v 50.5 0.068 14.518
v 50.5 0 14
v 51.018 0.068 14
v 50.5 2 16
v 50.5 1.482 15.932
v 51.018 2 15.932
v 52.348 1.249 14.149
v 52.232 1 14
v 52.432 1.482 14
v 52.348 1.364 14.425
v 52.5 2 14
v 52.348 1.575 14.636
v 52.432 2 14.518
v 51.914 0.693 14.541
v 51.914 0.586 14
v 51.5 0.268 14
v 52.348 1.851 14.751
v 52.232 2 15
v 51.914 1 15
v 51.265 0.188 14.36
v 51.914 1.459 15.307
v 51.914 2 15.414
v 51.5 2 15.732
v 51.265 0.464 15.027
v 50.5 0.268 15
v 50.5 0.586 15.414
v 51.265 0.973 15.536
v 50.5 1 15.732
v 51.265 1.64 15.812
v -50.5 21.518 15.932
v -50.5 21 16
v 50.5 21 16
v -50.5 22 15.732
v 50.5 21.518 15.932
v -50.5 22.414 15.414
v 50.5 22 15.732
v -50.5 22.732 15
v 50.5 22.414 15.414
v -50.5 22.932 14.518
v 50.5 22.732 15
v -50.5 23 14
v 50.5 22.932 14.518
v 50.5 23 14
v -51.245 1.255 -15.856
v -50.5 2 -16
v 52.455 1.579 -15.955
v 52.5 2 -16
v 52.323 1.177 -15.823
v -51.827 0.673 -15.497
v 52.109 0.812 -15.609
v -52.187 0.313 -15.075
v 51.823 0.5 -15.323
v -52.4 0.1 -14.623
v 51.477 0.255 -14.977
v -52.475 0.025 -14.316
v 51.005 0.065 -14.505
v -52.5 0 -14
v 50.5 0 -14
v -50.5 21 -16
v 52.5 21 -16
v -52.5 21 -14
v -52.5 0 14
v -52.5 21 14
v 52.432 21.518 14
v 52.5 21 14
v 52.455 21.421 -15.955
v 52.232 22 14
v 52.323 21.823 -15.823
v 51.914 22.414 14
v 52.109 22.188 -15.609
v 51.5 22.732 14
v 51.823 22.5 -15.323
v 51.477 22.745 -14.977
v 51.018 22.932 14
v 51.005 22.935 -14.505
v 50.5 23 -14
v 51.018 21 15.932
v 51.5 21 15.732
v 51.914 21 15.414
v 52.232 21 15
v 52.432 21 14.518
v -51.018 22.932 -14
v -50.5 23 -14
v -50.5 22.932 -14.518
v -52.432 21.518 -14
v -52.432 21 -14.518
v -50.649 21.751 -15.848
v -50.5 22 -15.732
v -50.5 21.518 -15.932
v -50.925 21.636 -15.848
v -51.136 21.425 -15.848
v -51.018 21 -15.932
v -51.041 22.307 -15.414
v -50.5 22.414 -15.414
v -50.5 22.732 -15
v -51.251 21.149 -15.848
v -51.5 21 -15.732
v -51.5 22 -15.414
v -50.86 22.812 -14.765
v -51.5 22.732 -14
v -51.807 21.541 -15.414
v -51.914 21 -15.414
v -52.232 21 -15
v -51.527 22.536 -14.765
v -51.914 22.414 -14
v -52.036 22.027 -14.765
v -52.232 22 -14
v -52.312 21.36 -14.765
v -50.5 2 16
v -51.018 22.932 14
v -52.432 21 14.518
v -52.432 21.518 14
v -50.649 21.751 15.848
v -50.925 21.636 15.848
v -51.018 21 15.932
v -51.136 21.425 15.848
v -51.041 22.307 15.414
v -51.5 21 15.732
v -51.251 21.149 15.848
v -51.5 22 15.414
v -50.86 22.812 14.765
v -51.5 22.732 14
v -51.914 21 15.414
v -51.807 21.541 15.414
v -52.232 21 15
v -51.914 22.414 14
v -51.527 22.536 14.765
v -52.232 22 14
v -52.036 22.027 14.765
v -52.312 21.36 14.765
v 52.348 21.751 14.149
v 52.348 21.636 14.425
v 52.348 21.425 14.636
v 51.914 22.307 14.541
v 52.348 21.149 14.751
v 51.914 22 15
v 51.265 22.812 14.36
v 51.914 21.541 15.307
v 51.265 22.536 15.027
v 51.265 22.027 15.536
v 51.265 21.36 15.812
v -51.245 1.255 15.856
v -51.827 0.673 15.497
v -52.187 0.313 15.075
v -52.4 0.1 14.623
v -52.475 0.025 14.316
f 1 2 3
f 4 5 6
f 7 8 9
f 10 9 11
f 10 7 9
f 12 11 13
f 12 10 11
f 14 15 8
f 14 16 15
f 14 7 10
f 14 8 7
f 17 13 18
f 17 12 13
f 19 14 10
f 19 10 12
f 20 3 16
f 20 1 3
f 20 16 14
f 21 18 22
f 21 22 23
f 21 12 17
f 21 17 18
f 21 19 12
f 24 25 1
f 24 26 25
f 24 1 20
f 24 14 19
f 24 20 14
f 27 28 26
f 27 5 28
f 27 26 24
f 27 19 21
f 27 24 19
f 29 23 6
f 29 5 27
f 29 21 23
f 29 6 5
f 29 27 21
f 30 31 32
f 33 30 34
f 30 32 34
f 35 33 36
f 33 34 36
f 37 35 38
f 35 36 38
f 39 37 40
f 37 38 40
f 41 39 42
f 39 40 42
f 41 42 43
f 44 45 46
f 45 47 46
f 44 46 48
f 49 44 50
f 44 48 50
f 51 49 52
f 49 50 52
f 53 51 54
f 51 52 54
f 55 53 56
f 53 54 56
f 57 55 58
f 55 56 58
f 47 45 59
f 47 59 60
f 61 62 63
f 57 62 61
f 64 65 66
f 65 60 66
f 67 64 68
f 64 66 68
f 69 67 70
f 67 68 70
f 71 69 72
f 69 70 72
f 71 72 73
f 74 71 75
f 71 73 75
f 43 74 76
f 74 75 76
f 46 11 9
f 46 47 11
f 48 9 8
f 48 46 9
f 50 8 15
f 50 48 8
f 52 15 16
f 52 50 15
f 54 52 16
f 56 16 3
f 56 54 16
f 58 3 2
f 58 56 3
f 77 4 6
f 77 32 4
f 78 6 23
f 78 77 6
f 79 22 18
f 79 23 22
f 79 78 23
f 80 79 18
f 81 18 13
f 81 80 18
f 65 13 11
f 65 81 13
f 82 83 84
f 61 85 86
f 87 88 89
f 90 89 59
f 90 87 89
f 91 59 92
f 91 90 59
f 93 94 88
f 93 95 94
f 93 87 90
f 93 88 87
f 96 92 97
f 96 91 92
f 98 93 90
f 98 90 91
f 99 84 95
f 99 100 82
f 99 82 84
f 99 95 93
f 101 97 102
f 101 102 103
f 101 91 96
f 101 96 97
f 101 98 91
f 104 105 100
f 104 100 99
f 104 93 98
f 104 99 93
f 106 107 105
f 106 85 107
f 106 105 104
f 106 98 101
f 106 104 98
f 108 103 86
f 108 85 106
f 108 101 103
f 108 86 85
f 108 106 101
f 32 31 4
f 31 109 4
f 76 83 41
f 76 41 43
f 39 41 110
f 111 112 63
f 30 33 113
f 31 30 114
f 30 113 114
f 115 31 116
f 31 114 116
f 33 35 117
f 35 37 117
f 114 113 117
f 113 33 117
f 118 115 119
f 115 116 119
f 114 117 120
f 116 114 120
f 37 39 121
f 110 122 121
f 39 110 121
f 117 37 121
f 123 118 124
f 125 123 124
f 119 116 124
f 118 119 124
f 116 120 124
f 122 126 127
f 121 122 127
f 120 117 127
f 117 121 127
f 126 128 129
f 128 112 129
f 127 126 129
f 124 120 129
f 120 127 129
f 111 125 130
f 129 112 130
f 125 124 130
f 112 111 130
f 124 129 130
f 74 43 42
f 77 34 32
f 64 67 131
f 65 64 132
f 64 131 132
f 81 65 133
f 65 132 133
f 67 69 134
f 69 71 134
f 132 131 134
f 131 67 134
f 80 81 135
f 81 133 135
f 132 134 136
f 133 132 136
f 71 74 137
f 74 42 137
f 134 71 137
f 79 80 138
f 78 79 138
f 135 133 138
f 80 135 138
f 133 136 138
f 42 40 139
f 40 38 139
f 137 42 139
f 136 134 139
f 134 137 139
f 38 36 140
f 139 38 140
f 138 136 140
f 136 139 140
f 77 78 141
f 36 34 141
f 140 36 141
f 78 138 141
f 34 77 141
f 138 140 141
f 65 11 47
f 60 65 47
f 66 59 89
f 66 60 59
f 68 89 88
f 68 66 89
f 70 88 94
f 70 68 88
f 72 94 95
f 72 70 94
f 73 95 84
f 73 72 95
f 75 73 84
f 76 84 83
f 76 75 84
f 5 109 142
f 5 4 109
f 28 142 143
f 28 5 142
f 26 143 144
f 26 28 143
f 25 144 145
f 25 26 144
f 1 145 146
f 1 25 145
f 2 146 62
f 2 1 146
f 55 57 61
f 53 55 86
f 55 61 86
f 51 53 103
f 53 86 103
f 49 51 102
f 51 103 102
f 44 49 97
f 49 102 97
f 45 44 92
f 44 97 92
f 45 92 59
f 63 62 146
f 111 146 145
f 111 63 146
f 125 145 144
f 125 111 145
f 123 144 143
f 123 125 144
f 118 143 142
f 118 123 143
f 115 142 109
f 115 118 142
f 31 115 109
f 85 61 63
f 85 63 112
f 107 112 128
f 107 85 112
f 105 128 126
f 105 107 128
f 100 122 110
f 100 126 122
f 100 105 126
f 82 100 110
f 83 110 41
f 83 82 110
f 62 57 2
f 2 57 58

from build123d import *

# Parameters (mm, degrees)
SKETCH1_W           = 105
SKETCH1_H           = 32
BOSS_EXTRUDE1_DEPTH = 23
FILLET1_R           = 2


with BuildPart() as part:
    # Sketch1 → Boss-Extrude1 (new body)
    with BuildSketch(Plane(origin=(0, 0, 0), x_dir=(1, 0, 0), z_dir=(0, 1, 0))):
        Rectangle(SKETCH1_W, SKETCH1_H)
    extrude(amount=BOSS_EXTRUDE1_DEPTH)

    # Fillet1
    fillet1_edges = [part.edges().sort_by_distance(p)[0] for p in [
        (-52.5, 23, 0),
        (0, 23, 16),
        (52.5, 23, 0),
        (0, 0, 16),
        (0, 0, -16),
        (52.5, 0, 0),
        (0, 23, -16),
        (52.5, 11.5, 16),
        (-52.5, 11.5, 16),
        (-52.5, 11.5, -16),
    ]]
    fillet(fillet1_edges, radius=FILLET1_R)


solid = part.part
